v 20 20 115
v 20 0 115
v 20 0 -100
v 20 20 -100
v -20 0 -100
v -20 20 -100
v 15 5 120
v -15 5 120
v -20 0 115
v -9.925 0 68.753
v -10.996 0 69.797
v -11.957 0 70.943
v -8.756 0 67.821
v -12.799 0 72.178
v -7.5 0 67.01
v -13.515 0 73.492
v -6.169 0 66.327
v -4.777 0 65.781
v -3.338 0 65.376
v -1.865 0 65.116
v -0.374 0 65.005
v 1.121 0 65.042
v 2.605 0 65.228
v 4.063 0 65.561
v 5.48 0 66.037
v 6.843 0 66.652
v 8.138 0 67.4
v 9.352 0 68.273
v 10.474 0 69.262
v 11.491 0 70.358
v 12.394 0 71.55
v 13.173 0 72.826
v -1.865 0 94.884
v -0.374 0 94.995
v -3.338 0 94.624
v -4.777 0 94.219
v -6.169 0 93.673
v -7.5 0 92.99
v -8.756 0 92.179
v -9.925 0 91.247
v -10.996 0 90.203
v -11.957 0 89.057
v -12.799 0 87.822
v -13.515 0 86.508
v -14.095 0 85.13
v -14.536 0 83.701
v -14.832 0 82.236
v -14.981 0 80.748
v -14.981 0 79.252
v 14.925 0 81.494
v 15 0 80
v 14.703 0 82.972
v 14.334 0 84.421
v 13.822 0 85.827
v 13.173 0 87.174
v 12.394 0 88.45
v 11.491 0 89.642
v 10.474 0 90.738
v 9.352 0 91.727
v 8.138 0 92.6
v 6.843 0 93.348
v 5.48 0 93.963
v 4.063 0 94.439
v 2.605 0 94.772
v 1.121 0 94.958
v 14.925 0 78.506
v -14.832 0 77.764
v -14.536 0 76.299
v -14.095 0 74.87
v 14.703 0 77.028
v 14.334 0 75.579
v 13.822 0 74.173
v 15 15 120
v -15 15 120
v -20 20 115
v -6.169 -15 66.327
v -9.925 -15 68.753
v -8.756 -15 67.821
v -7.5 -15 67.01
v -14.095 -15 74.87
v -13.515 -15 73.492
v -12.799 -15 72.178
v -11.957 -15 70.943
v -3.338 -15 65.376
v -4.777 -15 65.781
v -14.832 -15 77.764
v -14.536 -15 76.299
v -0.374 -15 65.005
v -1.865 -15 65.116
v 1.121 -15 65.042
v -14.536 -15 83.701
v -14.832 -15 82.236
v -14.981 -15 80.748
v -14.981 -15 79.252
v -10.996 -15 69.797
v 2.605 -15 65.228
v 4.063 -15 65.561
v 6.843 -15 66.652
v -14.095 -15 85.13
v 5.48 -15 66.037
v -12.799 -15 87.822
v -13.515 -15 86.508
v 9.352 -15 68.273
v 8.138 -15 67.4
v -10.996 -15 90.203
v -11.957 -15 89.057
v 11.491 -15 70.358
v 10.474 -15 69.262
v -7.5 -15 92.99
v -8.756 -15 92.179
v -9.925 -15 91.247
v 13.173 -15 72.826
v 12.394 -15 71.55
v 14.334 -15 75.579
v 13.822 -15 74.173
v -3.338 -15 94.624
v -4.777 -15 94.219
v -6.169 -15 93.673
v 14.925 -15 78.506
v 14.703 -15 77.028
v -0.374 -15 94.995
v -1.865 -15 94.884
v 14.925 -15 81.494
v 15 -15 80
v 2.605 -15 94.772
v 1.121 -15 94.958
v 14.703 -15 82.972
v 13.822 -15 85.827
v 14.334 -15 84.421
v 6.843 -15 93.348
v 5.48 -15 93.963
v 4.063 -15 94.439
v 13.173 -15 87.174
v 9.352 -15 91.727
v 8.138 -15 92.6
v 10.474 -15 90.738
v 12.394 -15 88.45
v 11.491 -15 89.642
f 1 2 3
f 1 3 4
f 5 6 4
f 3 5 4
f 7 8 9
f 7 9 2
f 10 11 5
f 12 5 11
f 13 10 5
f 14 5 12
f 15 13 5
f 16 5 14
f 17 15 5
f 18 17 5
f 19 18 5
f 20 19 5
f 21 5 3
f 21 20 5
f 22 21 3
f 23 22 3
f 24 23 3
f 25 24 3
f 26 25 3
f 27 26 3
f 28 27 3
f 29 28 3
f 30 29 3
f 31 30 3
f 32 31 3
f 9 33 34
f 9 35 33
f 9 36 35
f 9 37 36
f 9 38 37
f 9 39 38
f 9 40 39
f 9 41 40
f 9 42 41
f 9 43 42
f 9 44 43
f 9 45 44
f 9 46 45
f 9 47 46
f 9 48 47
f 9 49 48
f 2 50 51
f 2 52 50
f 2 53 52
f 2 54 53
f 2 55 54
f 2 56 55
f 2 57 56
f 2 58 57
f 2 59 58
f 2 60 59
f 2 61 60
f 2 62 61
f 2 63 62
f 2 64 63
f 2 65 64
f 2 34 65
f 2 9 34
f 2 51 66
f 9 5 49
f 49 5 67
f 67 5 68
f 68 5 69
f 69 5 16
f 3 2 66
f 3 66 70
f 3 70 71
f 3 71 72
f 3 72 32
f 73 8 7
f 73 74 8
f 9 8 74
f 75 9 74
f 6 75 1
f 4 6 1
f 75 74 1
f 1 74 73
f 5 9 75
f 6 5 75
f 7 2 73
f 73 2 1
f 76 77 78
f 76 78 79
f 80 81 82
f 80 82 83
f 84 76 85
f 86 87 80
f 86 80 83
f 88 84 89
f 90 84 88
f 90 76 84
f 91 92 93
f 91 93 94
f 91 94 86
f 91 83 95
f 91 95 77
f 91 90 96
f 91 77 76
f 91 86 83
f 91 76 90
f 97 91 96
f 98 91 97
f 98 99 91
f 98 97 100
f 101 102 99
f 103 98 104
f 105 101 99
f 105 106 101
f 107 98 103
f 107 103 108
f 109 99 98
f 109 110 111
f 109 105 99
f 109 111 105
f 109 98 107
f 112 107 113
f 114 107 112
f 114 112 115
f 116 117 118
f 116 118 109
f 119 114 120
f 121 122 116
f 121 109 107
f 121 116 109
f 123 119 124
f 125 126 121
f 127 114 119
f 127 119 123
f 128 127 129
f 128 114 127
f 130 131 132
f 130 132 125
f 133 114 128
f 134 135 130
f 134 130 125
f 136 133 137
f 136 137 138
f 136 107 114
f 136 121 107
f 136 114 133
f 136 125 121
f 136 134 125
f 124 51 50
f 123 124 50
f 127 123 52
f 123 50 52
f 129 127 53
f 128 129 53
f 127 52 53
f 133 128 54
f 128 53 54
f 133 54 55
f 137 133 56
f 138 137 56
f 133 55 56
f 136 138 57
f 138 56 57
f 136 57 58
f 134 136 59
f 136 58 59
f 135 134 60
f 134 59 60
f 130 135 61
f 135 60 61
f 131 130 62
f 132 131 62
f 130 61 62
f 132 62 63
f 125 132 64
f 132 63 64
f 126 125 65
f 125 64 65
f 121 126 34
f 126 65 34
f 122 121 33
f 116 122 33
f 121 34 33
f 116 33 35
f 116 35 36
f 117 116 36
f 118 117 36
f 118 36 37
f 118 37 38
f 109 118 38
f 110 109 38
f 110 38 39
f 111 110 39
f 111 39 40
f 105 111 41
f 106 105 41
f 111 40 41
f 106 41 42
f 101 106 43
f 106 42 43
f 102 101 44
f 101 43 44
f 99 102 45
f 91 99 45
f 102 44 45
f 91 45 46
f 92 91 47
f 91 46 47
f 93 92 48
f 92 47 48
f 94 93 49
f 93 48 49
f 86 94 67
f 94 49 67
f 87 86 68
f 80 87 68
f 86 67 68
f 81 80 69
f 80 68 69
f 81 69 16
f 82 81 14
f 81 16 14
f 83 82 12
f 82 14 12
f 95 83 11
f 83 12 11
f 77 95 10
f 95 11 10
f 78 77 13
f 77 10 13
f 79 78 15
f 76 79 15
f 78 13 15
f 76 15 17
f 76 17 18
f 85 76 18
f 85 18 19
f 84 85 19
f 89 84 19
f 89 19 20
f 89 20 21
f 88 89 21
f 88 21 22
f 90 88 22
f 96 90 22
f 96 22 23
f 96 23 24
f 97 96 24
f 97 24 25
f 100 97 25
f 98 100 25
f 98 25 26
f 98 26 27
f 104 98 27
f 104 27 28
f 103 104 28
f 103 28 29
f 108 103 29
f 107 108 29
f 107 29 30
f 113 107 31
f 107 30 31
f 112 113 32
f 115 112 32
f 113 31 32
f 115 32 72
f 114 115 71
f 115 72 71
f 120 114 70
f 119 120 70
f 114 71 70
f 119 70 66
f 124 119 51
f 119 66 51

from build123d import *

# Parameters (mm, degrees)
F0_W          = 40
F0_H          = 20
F1_DEPTH      = 120
F1_DEPTH_BACK = 100
F2_R          = 15
F3_DEPTH      = 15
F4_SIZE       = 5


with BuildPart() as f1:
    # F0 (on Top) → F1 (new body, two sides)
    with BuildSketch(Plane.XY) as f1_sk:
        with Locations((0, 10)):
            Rectangle(F0_W, F0_H)
    extrude(amount=F1_DEPTH)
    extrude(f1_sk.sketch, amount=-F1_DEPTH_BACK)

    # F2 (on face) → F3 (join)
    with BuildSketch(Plane.XZ):
        with Locations((0, 80)):
            Circle(F2_R)
    extrude(amount=F3_DEPTH)

    # F4
    f4_edges = [f1.edges().sort_by_distance(p)[0] for p in [
        (0, 0, 120),
        (20, 10, 120),
        (0, 20, 120),
        (-20, 10, 120),
    ]]
    chamfer(f4_edges, length=F4_SIZE)


solid = f1.part
